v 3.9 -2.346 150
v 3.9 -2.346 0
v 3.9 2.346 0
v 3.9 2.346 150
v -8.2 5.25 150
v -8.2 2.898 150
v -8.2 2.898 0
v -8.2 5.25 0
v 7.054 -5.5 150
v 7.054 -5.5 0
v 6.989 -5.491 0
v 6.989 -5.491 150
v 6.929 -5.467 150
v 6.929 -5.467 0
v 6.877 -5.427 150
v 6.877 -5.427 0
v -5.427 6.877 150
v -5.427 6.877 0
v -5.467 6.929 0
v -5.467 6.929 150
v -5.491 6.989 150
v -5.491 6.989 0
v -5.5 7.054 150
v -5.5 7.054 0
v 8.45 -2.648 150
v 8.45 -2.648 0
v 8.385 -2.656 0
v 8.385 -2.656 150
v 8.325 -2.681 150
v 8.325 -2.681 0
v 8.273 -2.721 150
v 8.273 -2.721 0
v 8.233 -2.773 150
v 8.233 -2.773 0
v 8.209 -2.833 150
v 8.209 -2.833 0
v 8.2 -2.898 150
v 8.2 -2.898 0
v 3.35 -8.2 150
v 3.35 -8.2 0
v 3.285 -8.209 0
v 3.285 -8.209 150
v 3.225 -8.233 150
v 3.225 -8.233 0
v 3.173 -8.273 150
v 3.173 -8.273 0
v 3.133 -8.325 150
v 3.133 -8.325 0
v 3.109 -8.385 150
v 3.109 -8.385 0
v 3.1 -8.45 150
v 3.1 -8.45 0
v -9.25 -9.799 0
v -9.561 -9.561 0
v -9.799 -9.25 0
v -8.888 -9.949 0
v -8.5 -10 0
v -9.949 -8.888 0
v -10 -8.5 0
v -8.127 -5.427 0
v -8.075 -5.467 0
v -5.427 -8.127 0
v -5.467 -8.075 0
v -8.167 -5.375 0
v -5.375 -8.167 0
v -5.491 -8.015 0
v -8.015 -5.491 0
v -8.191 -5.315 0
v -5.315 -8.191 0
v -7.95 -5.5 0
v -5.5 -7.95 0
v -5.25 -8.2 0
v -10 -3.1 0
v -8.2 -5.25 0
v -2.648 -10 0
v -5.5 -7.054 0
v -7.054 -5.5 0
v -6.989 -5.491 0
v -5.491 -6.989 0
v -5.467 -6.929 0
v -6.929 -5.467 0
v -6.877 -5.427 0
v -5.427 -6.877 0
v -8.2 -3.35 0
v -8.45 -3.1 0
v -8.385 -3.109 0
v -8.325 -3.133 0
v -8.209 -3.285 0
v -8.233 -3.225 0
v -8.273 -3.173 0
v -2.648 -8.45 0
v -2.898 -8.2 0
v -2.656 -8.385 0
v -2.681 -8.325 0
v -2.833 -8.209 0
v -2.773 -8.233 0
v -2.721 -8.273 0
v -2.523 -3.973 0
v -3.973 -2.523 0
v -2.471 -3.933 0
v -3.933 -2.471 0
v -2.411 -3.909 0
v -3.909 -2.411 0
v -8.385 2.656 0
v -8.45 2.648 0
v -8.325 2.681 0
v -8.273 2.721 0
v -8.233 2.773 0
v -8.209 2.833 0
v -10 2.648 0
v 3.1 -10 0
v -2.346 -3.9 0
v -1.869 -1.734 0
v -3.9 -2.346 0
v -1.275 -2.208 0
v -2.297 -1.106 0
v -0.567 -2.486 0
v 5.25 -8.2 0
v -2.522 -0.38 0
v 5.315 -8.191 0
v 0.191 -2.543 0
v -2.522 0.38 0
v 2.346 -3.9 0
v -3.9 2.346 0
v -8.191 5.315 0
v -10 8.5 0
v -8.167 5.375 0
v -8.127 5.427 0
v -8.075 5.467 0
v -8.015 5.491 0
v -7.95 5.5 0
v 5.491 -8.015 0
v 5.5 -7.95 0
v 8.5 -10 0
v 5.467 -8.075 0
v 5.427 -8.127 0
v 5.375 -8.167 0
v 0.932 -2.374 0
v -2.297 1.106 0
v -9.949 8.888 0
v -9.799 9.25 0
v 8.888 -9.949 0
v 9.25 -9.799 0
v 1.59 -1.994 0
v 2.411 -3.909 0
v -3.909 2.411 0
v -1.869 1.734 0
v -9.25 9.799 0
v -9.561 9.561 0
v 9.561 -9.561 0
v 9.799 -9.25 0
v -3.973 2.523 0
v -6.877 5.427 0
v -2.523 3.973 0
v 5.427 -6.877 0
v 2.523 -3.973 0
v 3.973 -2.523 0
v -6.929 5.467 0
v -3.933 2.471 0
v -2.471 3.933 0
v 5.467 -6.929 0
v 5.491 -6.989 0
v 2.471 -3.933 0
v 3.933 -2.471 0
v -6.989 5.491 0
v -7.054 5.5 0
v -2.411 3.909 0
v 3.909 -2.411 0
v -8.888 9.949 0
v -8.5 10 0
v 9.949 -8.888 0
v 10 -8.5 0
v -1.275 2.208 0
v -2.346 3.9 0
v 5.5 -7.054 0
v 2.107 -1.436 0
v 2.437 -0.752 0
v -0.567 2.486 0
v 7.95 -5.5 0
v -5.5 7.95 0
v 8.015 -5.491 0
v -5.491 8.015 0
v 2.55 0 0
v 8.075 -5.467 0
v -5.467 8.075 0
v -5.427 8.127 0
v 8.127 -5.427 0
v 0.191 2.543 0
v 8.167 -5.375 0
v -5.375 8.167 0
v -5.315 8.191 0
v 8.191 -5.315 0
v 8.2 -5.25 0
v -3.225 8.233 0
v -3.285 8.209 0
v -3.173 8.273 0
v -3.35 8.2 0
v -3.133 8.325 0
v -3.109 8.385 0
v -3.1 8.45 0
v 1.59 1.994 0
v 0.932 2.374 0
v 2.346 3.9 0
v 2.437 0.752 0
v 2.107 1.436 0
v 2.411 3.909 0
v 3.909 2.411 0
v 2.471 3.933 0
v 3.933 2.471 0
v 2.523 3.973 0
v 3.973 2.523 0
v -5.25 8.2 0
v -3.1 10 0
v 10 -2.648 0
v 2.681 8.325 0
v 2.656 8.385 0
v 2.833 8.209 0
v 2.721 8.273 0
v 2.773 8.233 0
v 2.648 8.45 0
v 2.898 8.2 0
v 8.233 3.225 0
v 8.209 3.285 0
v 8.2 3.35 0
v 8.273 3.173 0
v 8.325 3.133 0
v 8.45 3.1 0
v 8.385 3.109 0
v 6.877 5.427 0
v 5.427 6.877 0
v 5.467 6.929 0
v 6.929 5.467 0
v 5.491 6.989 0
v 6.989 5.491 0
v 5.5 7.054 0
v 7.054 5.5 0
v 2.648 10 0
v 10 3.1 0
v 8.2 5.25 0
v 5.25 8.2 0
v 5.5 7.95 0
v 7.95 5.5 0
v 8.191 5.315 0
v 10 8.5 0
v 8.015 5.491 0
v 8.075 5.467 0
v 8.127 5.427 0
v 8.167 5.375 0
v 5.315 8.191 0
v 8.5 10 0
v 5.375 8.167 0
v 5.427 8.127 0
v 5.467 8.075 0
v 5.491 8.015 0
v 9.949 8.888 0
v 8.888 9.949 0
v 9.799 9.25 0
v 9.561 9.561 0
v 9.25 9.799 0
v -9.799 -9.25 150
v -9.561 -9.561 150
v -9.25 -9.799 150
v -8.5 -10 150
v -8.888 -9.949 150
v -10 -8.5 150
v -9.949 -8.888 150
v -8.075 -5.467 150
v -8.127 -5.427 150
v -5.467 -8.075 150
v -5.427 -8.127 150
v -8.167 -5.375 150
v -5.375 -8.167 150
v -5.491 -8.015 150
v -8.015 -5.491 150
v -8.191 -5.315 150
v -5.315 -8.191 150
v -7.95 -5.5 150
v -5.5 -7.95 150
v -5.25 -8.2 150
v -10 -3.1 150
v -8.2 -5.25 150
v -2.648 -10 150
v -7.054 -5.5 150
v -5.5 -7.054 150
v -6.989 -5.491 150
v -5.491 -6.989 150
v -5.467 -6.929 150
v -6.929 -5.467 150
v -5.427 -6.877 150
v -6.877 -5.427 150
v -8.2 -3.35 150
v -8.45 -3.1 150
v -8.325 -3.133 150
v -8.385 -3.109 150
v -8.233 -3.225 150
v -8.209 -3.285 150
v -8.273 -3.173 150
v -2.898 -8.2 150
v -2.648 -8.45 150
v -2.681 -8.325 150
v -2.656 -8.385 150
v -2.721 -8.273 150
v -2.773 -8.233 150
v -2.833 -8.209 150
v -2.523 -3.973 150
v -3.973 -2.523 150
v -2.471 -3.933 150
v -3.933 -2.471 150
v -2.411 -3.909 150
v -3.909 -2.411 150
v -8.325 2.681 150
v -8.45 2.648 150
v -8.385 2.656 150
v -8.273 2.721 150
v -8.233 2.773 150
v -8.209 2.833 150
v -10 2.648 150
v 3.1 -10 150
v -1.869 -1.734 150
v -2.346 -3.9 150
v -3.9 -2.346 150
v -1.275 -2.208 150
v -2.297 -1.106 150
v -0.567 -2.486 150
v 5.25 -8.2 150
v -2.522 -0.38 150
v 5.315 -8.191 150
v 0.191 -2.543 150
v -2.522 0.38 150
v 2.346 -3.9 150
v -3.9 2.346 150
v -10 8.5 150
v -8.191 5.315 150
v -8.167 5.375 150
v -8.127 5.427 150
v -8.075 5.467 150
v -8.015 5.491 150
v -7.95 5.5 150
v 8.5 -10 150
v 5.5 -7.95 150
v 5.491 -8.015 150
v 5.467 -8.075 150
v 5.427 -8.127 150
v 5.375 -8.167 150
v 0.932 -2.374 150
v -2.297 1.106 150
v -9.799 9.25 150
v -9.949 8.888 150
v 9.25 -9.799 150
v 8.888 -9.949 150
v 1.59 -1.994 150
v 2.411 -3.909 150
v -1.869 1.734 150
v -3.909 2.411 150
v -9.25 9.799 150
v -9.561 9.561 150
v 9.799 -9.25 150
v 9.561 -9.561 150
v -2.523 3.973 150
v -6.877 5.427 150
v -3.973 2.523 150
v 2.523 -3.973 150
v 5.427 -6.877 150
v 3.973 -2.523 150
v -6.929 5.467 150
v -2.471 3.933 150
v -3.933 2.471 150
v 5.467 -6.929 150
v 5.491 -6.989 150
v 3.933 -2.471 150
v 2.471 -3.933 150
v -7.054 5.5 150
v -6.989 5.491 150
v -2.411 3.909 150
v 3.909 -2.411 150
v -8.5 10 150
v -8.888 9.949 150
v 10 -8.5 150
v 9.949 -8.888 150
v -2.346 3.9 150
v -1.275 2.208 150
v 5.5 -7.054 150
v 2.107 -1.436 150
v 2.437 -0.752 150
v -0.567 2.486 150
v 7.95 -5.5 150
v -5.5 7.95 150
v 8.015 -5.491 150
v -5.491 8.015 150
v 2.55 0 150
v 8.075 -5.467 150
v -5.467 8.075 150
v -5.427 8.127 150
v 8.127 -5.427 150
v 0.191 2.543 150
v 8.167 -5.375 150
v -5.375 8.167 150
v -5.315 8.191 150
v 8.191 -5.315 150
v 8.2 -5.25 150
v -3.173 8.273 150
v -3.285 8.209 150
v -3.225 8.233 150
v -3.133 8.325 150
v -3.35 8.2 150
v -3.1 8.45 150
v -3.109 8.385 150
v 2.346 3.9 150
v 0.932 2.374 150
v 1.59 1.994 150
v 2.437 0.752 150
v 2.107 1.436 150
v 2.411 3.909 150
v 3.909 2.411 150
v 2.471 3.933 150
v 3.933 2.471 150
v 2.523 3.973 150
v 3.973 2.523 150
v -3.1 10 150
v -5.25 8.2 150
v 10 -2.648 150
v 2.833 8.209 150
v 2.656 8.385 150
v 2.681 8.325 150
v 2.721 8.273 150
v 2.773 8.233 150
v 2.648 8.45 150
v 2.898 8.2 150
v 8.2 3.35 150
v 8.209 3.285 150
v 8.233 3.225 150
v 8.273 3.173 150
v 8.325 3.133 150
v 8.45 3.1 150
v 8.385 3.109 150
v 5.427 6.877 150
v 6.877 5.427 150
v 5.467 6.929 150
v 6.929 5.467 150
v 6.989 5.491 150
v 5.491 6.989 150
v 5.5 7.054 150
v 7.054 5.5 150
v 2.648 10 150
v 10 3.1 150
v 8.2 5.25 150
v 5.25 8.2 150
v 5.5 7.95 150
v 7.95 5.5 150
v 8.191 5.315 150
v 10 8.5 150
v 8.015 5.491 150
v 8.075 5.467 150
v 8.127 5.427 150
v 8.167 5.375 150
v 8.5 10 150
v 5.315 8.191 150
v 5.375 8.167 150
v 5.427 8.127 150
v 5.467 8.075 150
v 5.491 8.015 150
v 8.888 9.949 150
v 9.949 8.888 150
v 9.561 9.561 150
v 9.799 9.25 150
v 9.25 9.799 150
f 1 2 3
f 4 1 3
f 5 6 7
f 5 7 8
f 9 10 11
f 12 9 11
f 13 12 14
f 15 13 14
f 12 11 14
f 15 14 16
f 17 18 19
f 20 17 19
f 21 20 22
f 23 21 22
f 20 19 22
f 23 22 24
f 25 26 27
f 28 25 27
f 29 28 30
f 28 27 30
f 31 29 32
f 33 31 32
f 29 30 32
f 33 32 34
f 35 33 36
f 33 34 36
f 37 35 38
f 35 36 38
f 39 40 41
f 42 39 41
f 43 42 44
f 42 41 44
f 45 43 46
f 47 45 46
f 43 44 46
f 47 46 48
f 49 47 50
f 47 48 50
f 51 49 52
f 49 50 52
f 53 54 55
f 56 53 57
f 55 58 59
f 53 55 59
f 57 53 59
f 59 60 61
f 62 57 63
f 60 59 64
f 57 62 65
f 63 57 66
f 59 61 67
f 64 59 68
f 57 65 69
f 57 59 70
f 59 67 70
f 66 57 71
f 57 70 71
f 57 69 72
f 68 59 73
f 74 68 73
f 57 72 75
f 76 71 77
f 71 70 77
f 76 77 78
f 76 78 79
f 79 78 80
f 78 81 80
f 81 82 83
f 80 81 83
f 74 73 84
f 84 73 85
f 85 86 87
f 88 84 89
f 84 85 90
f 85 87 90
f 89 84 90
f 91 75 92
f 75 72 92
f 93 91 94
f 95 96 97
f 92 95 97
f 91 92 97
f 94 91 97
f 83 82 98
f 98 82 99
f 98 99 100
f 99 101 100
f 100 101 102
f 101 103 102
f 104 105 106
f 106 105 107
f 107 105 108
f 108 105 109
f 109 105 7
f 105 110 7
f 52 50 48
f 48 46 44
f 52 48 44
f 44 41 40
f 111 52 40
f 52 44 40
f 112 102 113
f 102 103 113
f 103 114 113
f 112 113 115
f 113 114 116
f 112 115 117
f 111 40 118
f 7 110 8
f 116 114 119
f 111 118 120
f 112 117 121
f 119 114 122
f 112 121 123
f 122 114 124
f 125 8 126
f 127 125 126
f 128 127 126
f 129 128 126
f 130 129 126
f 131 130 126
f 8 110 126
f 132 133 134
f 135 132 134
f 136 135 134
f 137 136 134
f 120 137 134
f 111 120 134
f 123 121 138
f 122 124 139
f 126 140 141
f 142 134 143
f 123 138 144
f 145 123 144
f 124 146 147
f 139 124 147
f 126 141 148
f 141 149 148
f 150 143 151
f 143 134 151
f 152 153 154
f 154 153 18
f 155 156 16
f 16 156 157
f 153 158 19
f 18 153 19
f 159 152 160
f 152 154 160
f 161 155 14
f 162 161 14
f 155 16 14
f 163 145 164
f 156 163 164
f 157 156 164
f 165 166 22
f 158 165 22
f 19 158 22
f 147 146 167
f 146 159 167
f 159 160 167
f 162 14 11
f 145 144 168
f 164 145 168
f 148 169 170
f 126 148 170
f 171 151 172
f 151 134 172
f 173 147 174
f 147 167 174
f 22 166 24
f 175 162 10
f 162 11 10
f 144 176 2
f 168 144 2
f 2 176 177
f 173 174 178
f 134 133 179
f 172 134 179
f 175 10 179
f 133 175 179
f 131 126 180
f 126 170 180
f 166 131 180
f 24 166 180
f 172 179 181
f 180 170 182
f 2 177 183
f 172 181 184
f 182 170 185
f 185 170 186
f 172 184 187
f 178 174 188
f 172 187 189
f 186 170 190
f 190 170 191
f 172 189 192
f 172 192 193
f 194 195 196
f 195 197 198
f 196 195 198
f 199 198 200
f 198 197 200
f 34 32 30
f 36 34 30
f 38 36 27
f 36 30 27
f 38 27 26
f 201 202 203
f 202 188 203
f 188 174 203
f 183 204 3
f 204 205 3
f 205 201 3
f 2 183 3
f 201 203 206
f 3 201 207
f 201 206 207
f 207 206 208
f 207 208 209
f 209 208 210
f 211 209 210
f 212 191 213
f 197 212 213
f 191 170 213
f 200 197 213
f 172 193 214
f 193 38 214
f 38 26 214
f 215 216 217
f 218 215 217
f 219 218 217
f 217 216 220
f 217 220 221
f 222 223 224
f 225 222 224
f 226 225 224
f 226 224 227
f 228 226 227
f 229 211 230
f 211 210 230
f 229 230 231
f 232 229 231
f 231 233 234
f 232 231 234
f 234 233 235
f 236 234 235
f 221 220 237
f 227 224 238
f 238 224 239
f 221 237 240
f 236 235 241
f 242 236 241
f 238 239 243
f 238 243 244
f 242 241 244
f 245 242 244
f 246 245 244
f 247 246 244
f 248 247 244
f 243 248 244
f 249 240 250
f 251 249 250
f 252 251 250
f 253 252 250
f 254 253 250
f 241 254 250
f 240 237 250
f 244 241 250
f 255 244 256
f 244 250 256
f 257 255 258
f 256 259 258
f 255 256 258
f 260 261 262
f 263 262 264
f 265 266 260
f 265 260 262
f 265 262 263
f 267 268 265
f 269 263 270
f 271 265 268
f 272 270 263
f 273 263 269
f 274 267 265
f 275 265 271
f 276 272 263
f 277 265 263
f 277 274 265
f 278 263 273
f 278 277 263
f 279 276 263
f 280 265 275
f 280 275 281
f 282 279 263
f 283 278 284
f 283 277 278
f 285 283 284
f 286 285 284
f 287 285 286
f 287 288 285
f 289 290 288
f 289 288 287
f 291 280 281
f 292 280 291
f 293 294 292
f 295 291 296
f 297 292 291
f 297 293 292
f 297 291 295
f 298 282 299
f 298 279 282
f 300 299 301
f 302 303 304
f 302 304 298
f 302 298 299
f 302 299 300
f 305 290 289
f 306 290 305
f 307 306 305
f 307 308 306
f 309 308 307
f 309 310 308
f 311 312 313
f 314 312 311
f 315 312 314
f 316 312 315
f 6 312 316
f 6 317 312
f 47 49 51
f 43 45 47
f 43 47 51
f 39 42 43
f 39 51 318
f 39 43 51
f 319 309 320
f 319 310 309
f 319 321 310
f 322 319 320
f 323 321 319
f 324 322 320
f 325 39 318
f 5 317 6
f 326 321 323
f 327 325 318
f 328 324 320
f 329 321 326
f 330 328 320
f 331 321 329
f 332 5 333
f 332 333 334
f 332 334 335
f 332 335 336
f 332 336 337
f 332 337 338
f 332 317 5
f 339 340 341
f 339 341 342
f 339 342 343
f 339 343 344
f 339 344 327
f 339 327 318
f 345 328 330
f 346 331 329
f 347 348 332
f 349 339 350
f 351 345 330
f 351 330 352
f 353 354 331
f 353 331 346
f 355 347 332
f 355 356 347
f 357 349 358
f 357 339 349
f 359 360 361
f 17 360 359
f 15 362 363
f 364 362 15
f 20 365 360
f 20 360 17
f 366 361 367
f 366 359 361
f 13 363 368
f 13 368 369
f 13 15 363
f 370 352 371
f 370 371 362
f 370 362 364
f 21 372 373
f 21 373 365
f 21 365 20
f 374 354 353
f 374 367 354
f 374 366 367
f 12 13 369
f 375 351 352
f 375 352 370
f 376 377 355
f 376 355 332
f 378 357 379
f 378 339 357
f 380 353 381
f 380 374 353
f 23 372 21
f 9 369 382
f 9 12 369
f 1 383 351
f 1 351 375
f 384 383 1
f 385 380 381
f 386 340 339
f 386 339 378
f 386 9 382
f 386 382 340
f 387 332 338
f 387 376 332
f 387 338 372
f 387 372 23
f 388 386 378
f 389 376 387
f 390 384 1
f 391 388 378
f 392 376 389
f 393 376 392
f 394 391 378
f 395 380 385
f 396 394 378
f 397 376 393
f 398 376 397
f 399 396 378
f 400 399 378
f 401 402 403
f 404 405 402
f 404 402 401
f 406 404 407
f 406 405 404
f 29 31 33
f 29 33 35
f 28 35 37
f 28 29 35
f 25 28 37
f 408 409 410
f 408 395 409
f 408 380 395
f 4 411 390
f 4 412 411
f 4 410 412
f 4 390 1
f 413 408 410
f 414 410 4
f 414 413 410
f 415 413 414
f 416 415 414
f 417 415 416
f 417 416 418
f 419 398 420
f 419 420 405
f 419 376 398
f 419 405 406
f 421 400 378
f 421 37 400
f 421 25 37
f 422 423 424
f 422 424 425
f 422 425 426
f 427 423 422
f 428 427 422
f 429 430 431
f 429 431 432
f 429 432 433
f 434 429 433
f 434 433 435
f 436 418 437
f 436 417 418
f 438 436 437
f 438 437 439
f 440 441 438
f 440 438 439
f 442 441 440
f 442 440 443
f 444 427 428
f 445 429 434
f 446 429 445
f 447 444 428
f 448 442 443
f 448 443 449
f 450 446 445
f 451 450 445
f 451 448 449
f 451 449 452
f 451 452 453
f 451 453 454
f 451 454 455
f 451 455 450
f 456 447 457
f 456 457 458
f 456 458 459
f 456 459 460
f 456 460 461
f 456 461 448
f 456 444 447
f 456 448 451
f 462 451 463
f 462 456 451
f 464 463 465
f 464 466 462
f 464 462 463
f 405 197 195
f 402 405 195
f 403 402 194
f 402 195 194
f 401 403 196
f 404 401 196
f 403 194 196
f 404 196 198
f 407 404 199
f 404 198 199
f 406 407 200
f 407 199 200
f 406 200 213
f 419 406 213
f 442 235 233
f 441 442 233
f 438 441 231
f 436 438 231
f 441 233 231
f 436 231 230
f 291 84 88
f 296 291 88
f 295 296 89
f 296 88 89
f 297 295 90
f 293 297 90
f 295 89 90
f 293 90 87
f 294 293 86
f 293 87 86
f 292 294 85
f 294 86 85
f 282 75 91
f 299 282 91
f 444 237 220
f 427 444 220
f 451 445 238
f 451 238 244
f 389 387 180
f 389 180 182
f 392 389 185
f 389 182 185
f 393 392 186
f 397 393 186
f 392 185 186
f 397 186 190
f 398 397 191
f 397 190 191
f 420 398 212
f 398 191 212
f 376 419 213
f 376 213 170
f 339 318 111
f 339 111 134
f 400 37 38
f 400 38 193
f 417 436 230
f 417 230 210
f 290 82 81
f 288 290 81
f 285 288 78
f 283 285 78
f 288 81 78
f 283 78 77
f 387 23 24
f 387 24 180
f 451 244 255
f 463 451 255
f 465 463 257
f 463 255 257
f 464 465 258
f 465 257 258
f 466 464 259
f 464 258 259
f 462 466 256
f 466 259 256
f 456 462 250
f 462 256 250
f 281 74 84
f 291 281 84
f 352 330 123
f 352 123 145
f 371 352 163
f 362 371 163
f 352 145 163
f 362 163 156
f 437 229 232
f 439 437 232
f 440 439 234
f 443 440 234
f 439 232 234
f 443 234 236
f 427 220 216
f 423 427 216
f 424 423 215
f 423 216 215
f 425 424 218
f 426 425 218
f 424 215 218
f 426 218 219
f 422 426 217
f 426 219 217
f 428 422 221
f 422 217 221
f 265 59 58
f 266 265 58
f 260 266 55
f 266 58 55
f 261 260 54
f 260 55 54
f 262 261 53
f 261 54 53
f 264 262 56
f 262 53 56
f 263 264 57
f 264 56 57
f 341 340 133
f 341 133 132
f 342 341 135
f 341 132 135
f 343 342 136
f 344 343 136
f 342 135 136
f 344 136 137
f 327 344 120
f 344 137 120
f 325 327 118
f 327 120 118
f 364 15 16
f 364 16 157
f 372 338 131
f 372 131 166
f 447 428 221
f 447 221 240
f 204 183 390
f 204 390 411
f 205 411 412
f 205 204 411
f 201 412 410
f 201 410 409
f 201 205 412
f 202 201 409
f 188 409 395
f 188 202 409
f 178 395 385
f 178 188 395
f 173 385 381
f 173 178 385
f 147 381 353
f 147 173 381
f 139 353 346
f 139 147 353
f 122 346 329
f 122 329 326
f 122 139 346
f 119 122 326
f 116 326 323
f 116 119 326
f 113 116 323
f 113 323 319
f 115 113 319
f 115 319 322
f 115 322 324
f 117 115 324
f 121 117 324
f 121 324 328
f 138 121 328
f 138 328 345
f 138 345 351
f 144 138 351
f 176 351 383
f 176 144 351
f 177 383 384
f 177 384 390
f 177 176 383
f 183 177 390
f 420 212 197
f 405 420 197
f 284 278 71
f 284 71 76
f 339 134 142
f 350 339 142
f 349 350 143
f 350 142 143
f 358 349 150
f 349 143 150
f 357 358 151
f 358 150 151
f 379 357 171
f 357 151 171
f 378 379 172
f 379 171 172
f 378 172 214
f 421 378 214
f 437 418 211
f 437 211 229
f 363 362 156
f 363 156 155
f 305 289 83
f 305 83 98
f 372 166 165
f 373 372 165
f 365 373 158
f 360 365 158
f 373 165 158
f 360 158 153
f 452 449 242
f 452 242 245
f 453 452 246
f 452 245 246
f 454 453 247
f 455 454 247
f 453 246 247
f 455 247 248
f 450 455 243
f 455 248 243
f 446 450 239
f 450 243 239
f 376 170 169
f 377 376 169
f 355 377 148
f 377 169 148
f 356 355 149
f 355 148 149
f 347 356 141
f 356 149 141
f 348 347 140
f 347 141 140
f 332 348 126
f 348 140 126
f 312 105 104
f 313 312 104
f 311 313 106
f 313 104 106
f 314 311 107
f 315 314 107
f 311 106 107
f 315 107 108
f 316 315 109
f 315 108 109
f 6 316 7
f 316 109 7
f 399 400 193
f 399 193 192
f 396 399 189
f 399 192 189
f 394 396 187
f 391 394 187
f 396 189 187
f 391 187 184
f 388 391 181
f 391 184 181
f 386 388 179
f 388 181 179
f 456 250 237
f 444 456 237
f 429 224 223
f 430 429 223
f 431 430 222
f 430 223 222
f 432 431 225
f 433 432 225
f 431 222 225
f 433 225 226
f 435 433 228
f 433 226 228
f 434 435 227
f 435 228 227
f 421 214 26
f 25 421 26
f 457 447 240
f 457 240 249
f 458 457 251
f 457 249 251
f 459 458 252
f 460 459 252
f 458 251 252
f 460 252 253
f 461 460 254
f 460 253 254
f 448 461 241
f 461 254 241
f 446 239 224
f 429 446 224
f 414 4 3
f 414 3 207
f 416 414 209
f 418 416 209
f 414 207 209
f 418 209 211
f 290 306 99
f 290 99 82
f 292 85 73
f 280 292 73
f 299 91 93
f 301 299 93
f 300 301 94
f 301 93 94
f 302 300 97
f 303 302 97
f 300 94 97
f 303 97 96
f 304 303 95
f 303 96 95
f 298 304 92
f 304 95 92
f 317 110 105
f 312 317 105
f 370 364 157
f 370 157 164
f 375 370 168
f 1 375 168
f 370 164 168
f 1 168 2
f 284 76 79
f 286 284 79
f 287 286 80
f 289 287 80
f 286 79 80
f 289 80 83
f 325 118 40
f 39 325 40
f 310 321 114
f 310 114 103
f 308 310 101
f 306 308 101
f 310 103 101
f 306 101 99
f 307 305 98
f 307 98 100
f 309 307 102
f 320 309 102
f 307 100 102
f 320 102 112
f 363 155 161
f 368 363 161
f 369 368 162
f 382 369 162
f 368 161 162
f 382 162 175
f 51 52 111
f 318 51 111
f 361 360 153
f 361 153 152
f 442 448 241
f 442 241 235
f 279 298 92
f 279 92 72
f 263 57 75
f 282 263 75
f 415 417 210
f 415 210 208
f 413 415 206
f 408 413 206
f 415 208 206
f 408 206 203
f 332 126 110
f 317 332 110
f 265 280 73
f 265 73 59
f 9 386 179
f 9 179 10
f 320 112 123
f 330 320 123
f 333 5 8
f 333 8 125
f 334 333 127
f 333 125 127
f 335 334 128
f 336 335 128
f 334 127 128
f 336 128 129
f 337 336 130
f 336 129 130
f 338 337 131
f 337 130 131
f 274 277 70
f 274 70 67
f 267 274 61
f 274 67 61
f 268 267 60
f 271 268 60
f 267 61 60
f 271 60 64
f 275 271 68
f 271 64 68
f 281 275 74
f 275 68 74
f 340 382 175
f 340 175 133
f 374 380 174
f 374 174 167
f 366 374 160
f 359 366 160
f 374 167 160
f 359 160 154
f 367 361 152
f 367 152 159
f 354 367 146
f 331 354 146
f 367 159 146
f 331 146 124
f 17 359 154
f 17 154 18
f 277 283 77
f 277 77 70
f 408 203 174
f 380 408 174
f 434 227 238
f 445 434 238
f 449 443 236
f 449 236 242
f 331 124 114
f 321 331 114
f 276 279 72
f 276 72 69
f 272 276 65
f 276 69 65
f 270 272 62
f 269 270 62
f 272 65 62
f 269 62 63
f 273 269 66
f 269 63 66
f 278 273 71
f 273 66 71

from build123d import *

# Parameters (mm, degrees)
SKETCH1_R           = 2.55
BOSS_EXTRUDE1_DEPTH = 150


with BuildPart() as part:
    # Sketch1 → Boss-Extrude1 (new body)
    with BuildSketch(Plane.XY):
        with BuildLine():
            Line((-8.5, -10), (-2.647623804, -10))
            Line((-2.647623804, -10), (-2.647623804, -8.45))
            ThreePointArc((-2.647623804, -8.45), (-2.720847109, -8.273223305), (-2.897623804, -8.2))
            Line((-2.897623804, -8.2), (-5.25, -8.2))
            ThreePointArc((-5.25, -8.2), (-5.426776695, -8.126776695), (-5.5, -7.95))
            Line((-5.5, -7.95), (-5.5, -7.053553391))
            ThreePointArc((-5.5, -7.053553391), (-5.480969883, -6.957882533), (-5.426776695, -6.876776695))
            Line((-5.426776695, -6.876776695), (-2.523223305, -3.973223305))
            ThreePointArc((-2.523223305, -3.973223305), (-2.442117467, -3.919030117), (-2.346446609, -3.9))
            Line((-2.346446609, -3.9), (2.346446609, -3.9))
            ThreePointArc((2.346446609, -3.9), (2.442117467, -3.919030117), (2.523223305, -3.973223305))
            Line((2.523223305, -3.973223305), (5.426776695, -6.876776695))
            ThreePointArc((5.426776695, -6.876776695), (5.480969883, -6.957882533), (5.5, -7.053553391))
            Line((5.5, -7.053553391), (5.5, -7.95))
            ThreePointArc((5.5, -7.95), (5.426776695, -8.126776695), (5.25, -8.2))
            Line((5.25, -8.2), (3.35, -8.2))
            ThreePointArc((3.35, -8.2), (3.173223305, -8.273223305), (3.1, -8.45))
            Line((3.1, -8.45), (3.1, -10))
            Line((3.1, -10), (8.5, -10))
            ThreePointArc((8.5, -10), (9.560660172, -9.560660172), (10, -8.5))
            Line((10, -8.5), (10, -2.647623804))
            Line((10, -2.647623804), (8.45, -2.647623804))
            ThreePointArc((8.45, -2.647623804), (8.273223305, -2.720847109), (8.2, -2.897623804))
            Line((8.2, -2.897623804), (8.2, -5.25))
            ThreePointArc((8.2, -5.25), (8.126776695, -5.426776695), (7.95, -5.5))
            Line((7.95, -5.5), (7.053553391, -5.5))
            ThreePointArc((7.053553391, -5.5), (6.957882533, -5.480969883), (6.876776695, -5.426776695))
            Line((6.876776695, -5.426776695), (3.973223305, -2.523223305))
            ThreePointArc((3.973223305, -2.523223305), (3.919030117, -2.442117467), (3.9, -2.346446609))
            Line((3.9, -2.346446609), (3.9, 2.346446609))
            ThreePointArc((3.9, 2.346446609), (3.919030117, 2.442117467), (3.973223305, 2.523223305))
            Line((3.973223305, 2.523223305), (6.876776695, 5.426776695))
            ThreePointArc((6.876776695, 5.426776695), (6.957882533, 5.480969883), (7.053553391, 5.5))
            Line((7.053553391, 5.5), (7.95, 5.5))
            ThreePointArc((7.95, 5.5), (8.126776695, 5.426776695), (8.2, 5.25))
            Line((8.2, 5.25), (8.2, 3.35))
            ThreePointArc((8.2, 3.35), (8.273223305, 3.173223305), (8.45, 3.1))
            Line((8.45, 3.1), (10, 3.1))
            Line((10, 3.1), (10, 8.5))
            ThreePointArc((10, 8.5), (9.560660172, 9.560660172), (8.5, 10))
            Line((8.5, 10), (2.647623804, 10))
            Line((2.647623804, 10), (2.647623804, 8.45))
            ThreePointArc((2.647623804, 8.45), (2.720847109, 8.273223305), (2.897623804, 8.2))
            Line((2.897623804, 8.2), (5.25, 8.2))
            ThreePointArc((5.25, 8.2), (5.426776695, 8.126776695), (5.5, 7.95))
            Line((5.5, 7.95), (5.5, 7.053553391))
            ThreePointArc((5.5, 7.053553391), (5.480969883, 6.957882533), (5.426776695, 6.876776695))
            Line((5.426776695, 6.876776695), (2.523223305, 3.973223305))
            ThreePointArc((2.523223305, 3.973223305), (2.442117467, 3.919030117), (2.346446609, 3.9))
            Line((2.346446609, 3.9), (-2.346446609, 3.9))
            ThreePointArc((-2.346446609, 3.9), (-2.442117467, 3.919030117), (-2.523223305, 3.973223305))
            Line((-2.523223305, 3.973223305), (-5.426776695, 6.876776695))
            ThreePointArc((-5.426776695, 6.876776695), (-5.480969883, 6.957882533), (-5.5, 7.053553391))
            Line((-5.5, 7.053553391), (-5.5, 7.95))
            ThreePointArc((-5.5, 7.95), (-5.426776695, 8.126776695), (-5.25, 8.2))
            Line((-5.25, 8.2), (-3.35, 8.2))
            ThreePointArc((-3.35, 8.2), (-3.173223305, 8.273223305), (-3.1, 8.45))
            Line((-3.1, 8.45), (-3.1, 10))
            Line((-3.1, 10), (-8.5, 10))
            ThreePointArc((-8.5, 10), (-9.560660172, 9.560660172), (-10, 8.5))
            Line((-10, 8.5), (-10, 2.647623804))
            Line((-10, 2.647623804), (-8.45, 2.647623804))
            ThreePointArc((-8.45, 2.647623804), (-8.273223305, 2.720847109), (-8.2, 2.897623804))
            Line((-8.2, 2.897623804), (-8.2, 5.25))
            ThreePointArc((-8.2, 5.25), (-8.126776695, 5.426776695), (-7.95, 5.5))
            Line((-7.95, 5.5), (-7.053553391, 5.5))
            ThreePointArc((-7.053553391, 5.5), (-6.957882533, 5.480969883), (-6.876776695, 5.426776695))
            Line((-6.876776695, 5.426776695), (-3.973223305, 2.523223305))
            ThreePointArc((-3.973223305, 2.523223305), (-3.919030117, 2.442117467), (-3.9, 2.346446609))
            Line((-3.9, 2.346446609), (-3.9, -2.346446609))
            ThreePointArc((-3.9, -2.346446609), (-3.919030117, -2.442117467), (-3.973223305, -2.523223305))
            Line((-3.973223305, -2.523223305), (-6.876776695, -5.426776695))
            ThreePointArc((-6.876776695, -5.426776695), (-6.957882533, -5.480969883), (-7.053553391, -5.5))
            Line((-7.053553391, -5.5), (-7.95, -5.5))
            ThreePointArc((-7.95, -5.5), (-8.126776695, -5.426776695), (-8.2, -5.25))
            Line((-8.2, -5.25), (-8.2, -3.35))
            ThreePointArc((-8.2, -3.35), (-8.273223305, -3.173223305), (-8.45, -3.1))
            Line((-8.45, -3.1), (-10, -3.1))
            Line((-10, -3.1), (-10, -8.5))
            ThreePointArc((-10, -8.5), (-9.560660172, -9.560660172), (-8.5, -10))
        make_face()
        Circle(SKETCH1_R, mode=Mode.SUBTRACT)
    extrude(amount=BOSS_EXTRUDE1_DEPTH)


solid = part.part
